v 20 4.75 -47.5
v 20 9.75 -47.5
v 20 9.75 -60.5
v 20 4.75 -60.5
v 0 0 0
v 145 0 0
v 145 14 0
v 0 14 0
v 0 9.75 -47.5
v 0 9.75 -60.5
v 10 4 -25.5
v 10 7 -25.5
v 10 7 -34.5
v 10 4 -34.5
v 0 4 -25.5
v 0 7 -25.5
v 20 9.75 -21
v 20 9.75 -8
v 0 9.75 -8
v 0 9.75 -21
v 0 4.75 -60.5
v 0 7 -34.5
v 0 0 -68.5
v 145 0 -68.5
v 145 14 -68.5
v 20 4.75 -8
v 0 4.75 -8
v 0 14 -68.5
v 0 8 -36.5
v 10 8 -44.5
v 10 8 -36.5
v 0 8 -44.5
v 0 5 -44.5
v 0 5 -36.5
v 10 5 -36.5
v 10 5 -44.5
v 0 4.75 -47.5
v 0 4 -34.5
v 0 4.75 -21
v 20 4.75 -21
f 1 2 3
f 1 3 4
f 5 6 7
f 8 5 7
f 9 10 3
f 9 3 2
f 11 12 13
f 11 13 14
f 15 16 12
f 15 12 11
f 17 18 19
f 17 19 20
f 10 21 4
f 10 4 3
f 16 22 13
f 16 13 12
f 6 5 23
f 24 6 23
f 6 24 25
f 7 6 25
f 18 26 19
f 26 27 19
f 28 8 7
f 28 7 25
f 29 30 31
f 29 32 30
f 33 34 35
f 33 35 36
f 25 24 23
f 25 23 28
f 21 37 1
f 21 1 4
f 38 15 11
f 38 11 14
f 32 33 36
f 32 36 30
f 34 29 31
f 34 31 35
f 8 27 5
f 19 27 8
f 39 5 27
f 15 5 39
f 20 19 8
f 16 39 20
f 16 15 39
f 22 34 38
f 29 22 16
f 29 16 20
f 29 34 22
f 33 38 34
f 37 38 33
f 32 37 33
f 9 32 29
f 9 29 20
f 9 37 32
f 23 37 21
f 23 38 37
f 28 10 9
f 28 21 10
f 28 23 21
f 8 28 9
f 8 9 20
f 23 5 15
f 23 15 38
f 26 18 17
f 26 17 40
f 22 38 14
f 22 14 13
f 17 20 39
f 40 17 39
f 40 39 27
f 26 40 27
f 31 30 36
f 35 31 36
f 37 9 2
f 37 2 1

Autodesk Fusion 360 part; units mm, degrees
box "BoxPrimitive1" add length 68.5 width 145 height 14 placed x (0, 0, -1) y (-1, 0, 0) z (0, 1, 0) at (145, 0, 0)
sketch "USB1" plane through (0, 0, 0) normal (-1, 0, 0) x (0, -1, 0)
  line L0 (-14, -68.5) -> (0, -68.5)
  line L1 (0, -68.5) -> (0, 0)
  line L2 (0, 0) -> (-14, 0)
  line L3 (-14, 0) -> (-14, -68.5)
  line L4 (-4.75, -60.5) -> (-9.75, -60.5)
  line L5 (-9.75, -60.5) -> (-9.75, -47.5)
  line L6 (-9.75, -47.5) -> (-4.75, -47.5)
  line L7 (-4.75, -47.5) -> (-4.75, -60.5)
  dimension "d14" = 5
  dimension "d15" = 13
  dimension "d16" = 8
  dimension "d17" = 4.25
extrude "Extrude USB1" cut sketch "USB1" against normal blind 20 contours L4 L5 L6 L7
sketch "USB4" plane through (0, 0, 0) normal (-1, 0, 0) x (0, -1, 0)
  line L0 (-14, -68.5) -> (0, -68.5)
  line L1 (0, -68.5) -> (0, 0)
  line L2 (-14, 0) -> (-14, -68.5)
  line L3 (-9.75, -21) -> (-4.75, -21)
  line L4 (-4.75, -21) -> (-4.75, -8)
  line L5 (-4.75, -8) -> (-9.75, -8)
  line L6 (-9.75, -8) -> (-9.75, -21)
  line L7 (0, 0) -> (-14, 0)
  dimension "d21" = 13
  dimension "d22" = 4.25
  dimension "d23" = 5
  dimension "d53" = 8
extrude "Extrude USB4" cut sketch "USB4" against normal blind 20 contours L3 L4 L5 L6
sketch "Sketch9" plane through (0, 0, 0) normal (-1, 0, 0) x (0, -1, 0)
  line L0 (-5, -44.5) -> (-8, -44.5)
  line L1 (-8, -44.5) -> (-8, -36.5)
  line L2 (-8, -36.5) -> (-5, -36.5)
  line L3 (-5, -36.5) -> (-5, -44.5)
  line L4 (0, -68.5) -> (0, 0)
  line L5 (-9.75, -47.5) -> (-4.75, -47.5)
  dimension "d34" = 8
  dimension "d35" = 3
  dimension "d36" = 5
  dimension "d37" = 3
extrude "Extrude4" cut sketch "Sketch9" against normal blind 10
sketch "Sketch10" plane through (0, 0, 0) normal (-1, 0, 0) x (0, -1, 0)
  line L0 (-4, -34.5) -> (-7, -34.5)
  line L1 (-7, -34.5) -> (-7, -25.5)
  line L2 (-7, -25.5) -> (-4, -25.5)
  line L3 (-4, -25.5) -> (-4, -34.5)
  line L4 (0, -68.5) -> (0, 0)
  line L5 (-9.75, -21) -> (-4.75, -21)
  dimension "d40" = 3
  dimension "d41" = 9
  dimension "d42" = 4
  dimension "d43" = 4.5
extrude "Extrude5" cut sketch "Sketch10" against normal blind 10
sketch "Sketch12" plane through (0, 0, 0) normal (0, 0, 1) x (-1, 0, 0)
  line L0 (0, 0) -> (-145, 0)
  line L1 (-145, 0) -> (-145, -14)
  line L2 (-145, -14) -> (0, -14)
  line L3 (0, 0) -> (0, -13.5)
sketch "Sketch15" plane through (0, 0, -68.5) normal (0, 0, -1) x (1, 0, 0)
  line L0 (145, -14) -> (145, 0)
  line L1 (145, 0) -> (0, 0)
  line L2 (0, 0) -> (0, -14)
  line L3 (0, -14) -> (145, -14)
  line L4 (15, -9.5) -> (25, -9.5)
  line L5 (25, -9.5) -> (25, -4.5)
  line L6 (25, -4.5) -> (15, -4.5)
  line L7 (15, -4.5) -> (15, -9.5)
